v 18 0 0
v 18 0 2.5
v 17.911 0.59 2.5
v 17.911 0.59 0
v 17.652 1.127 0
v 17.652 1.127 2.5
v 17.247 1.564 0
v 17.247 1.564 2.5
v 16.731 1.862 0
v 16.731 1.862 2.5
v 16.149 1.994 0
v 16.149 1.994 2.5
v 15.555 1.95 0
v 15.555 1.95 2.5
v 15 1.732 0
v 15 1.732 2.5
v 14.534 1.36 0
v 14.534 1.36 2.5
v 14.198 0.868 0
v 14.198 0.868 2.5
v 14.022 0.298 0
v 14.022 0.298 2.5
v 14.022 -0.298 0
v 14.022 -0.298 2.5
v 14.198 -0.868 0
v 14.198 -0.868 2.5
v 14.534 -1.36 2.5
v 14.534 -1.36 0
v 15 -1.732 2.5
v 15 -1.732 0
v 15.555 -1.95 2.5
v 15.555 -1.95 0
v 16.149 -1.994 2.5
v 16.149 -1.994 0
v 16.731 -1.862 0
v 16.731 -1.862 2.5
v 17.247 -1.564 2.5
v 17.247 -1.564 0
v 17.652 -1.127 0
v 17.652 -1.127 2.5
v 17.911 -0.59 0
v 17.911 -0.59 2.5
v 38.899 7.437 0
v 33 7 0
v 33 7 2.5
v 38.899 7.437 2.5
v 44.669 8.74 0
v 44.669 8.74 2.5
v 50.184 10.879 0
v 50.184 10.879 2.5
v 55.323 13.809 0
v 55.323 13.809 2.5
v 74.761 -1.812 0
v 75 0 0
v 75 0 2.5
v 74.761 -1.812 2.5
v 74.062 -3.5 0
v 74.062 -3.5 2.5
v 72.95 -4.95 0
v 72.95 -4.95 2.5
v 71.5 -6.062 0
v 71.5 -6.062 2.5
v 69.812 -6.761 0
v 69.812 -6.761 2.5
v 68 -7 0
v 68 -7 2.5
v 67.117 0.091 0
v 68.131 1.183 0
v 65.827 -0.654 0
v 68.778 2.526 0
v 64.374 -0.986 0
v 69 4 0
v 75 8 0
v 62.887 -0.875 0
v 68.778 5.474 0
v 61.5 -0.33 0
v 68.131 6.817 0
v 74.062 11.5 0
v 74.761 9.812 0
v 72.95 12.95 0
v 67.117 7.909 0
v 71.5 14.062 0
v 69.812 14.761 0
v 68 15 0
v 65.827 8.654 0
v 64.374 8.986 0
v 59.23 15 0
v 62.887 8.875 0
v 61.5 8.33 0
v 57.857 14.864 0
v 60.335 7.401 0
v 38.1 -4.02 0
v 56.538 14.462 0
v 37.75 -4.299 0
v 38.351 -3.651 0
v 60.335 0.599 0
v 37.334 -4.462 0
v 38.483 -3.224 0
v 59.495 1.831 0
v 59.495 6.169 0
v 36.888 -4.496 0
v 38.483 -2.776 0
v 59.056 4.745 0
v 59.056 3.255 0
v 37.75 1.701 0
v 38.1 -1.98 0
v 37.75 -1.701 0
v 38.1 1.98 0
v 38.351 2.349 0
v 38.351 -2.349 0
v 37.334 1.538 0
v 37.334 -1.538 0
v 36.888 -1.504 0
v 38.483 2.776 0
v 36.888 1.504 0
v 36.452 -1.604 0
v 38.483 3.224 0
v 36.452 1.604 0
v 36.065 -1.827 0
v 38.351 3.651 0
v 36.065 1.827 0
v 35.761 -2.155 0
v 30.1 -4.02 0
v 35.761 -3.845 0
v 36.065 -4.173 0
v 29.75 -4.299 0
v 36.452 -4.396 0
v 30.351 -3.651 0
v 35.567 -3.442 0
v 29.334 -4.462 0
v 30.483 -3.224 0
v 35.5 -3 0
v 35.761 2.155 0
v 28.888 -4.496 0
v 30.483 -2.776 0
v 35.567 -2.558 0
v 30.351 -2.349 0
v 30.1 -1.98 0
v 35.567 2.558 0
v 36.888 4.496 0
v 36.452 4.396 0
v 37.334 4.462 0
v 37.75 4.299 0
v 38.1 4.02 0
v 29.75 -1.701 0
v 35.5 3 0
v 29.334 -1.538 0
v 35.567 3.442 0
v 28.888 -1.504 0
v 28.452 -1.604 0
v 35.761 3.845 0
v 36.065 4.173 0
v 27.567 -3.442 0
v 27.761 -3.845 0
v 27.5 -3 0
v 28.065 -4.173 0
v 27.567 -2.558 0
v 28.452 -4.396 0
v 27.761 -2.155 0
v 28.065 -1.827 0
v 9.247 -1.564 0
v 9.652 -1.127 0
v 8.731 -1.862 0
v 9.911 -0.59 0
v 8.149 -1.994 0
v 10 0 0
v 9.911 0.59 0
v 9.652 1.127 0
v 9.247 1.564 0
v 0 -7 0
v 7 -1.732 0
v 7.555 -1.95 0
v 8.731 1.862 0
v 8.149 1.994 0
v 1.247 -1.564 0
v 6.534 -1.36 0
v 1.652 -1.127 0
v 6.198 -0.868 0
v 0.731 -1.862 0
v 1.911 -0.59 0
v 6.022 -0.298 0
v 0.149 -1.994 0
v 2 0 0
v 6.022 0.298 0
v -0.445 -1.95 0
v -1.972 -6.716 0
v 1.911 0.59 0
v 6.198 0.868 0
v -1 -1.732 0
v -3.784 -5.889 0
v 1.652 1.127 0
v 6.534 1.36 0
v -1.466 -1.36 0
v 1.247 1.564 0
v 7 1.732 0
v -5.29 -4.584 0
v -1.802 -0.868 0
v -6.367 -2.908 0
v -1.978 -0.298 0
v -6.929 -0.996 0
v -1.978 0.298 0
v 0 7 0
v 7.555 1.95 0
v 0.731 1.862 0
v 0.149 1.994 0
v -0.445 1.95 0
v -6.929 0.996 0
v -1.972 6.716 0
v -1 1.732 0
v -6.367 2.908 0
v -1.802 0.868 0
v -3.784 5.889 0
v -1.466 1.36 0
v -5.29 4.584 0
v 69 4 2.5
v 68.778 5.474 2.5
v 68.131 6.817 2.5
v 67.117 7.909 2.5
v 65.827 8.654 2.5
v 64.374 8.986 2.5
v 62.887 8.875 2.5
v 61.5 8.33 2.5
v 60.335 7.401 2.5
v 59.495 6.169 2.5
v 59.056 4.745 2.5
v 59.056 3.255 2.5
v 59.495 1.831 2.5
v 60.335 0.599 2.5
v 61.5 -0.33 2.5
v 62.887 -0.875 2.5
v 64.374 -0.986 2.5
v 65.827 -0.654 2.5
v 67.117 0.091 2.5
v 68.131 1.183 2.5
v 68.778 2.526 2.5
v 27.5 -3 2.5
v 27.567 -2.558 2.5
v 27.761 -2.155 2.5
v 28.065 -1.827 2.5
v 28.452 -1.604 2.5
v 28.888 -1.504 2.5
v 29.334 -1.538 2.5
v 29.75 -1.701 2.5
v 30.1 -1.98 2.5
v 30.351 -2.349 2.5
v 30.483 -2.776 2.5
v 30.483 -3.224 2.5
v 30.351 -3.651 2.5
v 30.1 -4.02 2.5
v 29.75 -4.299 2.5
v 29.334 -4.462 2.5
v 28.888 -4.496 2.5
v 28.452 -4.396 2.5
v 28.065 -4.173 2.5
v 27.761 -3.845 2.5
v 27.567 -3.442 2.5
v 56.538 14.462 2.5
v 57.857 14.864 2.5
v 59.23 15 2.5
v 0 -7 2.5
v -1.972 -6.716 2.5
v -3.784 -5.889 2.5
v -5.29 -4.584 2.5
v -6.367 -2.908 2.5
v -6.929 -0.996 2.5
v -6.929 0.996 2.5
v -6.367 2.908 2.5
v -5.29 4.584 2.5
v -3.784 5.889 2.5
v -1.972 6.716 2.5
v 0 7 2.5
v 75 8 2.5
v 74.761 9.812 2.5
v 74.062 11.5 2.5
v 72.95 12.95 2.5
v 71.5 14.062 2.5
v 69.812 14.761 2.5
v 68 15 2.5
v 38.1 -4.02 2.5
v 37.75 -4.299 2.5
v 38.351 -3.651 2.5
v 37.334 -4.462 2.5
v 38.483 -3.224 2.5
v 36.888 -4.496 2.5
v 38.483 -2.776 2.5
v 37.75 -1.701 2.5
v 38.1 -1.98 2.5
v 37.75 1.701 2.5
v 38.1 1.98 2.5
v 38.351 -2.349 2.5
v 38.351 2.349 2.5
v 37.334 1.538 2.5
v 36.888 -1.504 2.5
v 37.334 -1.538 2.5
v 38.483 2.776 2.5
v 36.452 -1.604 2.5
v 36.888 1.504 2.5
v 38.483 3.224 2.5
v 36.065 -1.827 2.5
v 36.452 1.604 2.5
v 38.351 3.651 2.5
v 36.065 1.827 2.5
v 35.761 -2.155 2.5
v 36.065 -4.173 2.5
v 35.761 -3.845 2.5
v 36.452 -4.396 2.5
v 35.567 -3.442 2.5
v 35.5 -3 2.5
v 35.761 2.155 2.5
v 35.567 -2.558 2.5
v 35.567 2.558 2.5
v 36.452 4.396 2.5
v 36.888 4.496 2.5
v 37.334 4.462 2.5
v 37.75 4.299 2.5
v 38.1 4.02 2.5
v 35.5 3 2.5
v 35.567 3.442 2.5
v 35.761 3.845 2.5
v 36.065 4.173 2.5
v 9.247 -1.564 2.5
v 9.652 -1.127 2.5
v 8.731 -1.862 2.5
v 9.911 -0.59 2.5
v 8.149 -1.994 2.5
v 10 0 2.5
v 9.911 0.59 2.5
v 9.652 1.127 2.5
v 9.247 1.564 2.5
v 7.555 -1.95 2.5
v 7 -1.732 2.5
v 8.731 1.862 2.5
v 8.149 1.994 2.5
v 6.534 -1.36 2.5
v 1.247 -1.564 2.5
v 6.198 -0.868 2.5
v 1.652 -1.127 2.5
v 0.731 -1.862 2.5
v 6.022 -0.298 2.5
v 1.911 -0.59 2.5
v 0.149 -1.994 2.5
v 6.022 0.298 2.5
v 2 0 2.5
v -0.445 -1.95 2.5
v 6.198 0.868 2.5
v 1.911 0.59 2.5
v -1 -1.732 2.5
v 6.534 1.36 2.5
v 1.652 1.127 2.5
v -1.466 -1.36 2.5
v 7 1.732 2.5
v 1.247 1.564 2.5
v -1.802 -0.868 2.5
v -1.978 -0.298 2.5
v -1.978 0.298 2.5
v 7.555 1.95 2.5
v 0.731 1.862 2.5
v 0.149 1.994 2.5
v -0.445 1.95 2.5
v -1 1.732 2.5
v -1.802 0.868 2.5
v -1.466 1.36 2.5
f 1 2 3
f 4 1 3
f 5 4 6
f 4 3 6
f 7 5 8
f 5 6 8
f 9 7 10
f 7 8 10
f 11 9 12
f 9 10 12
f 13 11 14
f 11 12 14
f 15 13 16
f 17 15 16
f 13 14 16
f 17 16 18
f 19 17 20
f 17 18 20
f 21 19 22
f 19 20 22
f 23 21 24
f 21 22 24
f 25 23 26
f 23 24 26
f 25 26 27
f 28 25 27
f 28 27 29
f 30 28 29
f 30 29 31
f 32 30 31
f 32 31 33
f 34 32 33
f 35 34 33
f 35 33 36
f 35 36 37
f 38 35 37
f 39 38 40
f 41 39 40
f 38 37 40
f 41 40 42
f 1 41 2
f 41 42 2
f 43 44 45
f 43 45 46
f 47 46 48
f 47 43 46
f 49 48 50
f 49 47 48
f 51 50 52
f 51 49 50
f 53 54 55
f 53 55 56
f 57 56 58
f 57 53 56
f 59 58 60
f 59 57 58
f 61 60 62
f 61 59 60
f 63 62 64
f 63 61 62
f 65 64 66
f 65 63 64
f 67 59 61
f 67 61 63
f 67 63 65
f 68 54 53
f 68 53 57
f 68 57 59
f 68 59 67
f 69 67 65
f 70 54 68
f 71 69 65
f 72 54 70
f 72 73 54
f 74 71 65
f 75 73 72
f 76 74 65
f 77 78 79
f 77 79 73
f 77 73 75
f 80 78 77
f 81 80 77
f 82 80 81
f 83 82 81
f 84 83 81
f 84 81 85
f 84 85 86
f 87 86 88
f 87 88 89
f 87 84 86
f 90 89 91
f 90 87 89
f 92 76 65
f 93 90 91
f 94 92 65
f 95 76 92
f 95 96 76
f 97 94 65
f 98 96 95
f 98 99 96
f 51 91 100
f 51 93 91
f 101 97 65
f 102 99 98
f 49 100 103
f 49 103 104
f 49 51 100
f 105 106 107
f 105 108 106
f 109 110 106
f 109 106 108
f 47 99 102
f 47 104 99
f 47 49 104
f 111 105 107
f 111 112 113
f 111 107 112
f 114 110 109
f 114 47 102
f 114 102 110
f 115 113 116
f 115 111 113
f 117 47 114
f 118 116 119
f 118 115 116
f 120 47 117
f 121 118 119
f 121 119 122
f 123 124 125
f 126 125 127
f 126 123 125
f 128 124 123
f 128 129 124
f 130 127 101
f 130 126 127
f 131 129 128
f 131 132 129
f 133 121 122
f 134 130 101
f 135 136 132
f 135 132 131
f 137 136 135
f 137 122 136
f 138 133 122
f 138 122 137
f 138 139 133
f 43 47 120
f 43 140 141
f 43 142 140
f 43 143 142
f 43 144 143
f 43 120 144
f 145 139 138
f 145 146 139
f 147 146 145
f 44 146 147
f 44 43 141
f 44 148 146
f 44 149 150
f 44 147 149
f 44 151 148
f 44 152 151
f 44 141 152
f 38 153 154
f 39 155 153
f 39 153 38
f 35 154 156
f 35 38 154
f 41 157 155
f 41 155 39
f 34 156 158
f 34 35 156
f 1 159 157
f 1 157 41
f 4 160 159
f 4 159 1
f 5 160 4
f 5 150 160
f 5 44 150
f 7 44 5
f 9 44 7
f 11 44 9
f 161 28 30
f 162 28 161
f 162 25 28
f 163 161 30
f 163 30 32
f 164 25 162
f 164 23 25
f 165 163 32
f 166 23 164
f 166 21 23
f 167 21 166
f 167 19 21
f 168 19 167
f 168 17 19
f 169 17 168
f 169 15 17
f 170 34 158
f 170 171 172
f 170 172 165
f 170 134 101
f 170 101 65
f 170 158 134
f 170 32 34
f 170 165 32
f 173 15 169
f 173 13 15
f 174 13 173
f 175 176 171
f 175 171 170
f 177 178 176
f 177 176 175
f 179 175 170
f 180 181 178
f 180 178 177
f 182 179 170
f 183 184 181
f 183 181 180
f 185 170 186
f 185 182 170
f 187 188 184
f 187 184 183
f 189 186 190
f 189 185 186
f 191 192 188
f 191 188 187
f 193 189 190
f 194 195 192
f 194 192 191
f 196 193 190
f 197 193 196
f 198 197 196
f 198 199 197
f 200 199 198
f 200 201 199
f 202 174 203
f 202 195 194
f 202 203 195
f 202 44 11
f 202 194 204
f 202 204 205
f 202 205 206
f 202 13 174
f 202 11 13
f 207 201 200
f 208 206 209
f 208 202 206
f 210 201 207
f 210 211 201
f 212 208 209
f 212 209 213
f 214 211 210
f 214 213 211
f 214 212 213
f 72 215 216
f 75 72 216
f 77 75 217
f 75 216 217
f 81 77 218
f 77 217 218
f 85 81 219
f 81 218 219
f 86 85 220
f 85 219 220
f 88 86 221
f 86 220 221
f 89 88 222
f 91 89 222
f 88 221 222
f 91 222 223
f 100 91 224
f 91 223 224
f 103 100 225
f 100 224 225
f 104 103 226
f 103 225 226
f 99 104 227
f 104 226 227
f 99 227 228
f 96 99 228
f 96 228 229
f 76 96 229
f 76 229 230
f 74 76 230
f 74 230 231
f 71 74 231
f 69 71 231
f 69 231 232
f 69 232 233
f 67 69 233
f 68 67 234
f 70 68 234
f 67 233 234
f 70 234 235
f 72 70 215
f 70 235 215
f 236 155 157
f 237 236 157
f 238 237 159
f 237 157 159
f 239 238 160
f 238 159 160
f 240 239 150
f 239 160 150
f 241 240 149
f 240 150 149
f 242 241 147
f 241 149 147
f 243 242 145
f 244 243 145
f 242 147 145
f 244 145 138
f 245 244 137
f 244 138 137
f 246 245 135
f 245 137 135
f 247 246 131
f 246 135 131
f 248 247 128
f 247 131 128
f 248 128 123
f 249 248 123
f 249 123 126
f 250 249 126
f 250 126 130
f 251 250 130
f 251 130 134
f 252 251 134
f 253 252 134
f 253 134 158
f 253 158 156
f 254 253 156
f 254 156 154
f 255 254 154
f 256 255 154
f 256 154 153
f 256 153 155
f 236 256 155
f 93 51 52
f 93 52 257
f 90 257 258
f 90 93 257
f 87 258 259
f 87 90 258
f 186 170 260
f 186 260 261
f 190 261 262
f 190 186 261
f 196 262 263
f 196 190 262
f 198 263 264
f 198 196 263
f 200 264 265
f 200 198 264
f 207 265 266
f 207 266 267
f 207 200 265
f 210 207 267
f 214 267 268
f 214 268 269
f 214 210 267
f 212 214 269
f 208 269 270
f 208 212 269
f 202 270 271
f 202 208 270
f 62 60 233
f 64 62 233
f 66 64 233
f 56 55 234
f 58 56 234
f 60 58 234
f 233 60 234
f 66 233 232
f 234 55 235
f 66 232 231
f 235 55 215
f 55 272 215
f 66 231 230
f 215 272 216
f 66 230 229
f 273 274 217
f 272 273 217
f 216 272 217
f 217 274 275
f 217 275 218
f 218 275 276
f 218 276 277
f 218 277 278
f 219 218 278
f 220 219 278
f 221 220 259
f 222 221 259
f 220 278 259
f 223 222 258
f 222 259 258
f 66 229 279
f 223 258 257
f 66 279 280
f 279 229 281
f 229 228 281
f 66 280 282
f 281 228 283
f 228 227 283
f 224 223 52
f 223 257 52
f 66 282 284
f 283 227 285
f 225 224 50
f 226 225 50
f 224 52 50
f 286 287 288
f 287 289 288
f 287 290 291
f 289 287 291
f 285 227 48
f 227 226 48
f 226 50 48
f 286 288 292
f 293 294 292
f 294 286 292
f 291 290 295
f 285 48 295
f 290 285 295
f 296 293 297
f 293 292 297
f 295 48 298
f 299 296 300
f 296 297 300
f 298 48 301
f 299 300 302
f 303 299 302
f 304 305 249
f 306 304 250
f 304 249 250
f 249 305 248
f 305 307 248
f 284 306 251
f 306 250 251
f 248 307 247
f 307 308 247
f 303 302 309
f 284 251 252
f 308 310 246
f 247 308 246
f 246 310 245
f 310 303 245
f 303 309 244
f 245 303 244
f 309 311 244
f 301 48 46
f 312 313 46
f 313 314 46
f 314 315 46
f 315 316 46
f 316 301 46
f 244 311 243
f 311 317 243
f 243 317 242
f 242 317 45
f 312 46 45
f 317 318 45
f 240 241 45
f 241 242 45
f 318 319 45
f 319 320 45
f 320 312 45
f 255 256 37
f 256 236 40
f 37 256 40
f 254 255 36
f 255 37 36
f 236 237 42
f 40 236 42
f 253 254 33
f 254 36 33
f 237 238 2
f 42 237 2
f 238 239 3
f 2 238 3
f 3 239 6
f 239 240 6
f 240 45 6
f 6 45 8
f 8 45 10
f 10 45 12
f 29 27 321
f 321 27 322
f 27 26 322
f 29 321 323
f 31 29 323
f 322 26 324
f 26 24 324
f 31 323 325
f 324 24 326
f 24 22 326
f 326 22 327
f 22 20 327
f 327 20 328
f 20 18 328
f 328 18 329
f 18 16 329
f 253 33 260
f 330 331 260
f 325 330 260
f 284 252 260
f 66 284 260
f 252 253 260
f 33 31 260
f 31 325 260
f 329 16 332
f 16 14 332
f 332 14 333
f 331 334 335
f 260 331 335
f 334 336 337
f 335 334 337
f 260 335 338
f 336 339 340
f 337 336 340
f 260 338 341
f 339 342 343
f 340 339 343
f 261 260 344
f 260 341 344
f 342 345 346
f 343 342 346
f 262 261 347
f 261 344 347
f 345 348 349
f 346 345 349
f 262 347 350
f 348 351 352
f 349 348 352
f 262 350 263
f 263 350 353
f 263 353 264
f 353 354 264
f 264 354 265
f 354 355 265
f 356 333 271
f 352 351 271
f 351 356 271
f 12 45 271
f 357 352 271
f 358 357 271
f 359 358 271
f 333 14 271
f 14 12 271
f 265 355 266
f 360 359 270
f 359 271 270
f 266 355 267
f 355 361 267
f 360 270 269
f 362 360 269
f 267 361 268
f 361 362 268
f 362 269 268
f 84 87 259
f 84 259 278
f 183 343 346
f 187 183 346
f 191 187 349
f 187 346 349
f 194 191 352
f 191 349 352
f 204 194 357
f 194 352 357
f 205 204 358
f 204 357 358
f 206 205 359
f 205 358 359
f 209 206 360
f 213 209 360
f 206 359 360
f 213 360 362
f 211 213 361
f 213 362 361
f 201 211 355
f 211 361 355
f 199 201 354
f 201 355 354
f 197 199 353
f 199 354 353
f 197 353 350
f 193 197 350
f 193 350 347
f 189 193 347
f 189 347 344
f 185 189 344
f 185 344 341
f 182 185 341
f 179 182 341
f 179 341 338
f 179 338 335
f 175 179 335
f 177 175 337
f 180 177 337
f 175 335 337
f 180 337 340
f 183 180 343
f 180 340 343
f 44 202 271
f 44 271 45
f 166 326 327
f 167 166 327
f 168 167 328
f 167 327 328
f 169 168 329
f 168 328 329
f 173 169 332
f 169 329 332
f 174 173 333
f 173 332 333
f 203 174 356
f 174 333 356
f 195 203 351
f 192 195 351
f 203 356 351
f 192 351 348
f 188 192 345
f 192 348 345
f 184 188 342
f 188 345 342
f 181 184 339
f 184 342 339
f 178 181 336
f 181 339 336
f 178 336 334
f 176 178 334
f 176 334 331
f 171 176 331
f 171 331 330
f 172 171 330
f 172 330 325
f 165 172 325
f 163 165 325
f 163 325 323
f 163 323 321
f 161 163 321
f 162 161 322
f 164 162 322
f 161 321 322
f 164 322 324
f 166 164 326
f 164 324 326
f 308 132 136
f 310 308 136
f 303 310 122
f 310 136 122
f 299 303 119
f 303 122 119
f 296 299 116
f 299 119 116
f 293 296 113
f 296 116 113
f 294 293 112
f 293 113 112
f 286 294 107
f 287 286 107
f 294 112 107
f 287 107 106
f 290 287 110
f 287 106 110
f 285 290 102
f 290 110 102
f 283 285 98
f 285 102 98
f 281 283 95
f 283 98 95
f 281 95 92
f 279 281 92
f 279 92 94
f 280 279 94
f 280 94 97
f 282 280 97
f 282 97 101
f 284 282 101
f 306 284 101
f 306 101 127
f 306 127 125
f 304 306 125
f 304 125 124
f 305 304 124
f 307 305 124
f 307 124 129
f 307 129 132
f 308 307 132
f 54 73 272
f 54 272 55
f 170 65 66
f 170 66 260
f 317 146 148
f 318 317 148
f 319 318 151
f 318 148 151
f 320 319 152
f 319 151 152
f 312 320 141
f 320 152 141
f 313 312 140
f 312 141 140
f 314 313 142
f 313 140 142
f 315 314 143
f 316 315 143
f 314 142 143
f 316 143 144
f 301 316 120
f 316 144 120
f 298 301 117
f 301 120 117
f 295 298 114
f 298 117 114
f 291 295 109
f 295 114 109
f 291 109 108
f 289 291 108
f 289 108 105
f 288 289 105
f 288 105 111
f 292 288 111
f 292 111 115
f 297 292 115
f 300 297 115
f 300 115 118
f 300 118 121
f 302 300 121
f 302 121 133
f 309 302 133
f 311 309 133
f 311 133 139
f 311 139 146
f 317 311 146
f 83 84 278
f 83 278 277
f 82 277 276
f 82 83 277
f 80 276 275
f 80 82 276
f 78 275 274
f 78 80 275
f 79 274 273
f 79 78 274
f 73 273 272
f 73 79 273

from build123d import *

# Parameters (mm, degrees)
BOSS_EXTRUDE1_DEPTH   = 2.5
SKETCH2_R             = 2
CUT_EXTRUDE1_DEPTH    = 2.5
SKETCH3_R             = 5
CUT_EXTRUDE2_DEPTH    = 2.5
F_3_0MM_DOWEL_HOLE2_D = 3


with BuildPart() as part:
    # Sketch1 → Boss-Extrude1 (new body)
    with BuildSketch(Plane.XY):
        with BuildLine():
            Line((0, 7), (33, 7))
            ThreePointArc((33, 7), (44.66919932, 8.739971416), (55.323194976, 13.808510638))
            ThreePointArc((55.323194976, 13.808510638), (57.187644216, 14.695505002), (59.229754097, 15))
            Line((59.229754097, 15), (68, 15))
            ThreePointArc((68, 15), (72.949747468, 12.949747468), (75, 8))
            Line((75, 8), (75, 0))
            ThreePointArc((75, 0), (72.949747468, -4.949747468), (68, -7))
            Line((68, -7), (0, -7))
            ThreePointArc((0, -7), (-7, 0), (0, 7))
        make_face()
    extrude(amount=BOSS_EXTRUDE1_DEPTH)

    # Sketch2 → Cut-Extrude1 (cut)
    with BuildSketch(Plane.XY.offset(2.5)):
        Circle(SKETCH2_R)
        with Locations((8, 0)):
            Circle(SKETCH2_R)
        with Locations((16, 0)):
            Circle(SKETCH2_R)
    extrude(amount=-CUT_EXTRUDE1_DEPTH, mode=Mode.SUBTRACT)

    # Sketch3 → Cut-Extrude2 (cut)
    with BuildSketch(Plane.XY.offset(2.5)):
        with Locations((64, 4)):
            Circle(SKETCH3_R)
    extrude(amount=-CUT_EXTRUDE2_DEPTH, mode=Mode.SUBTRACT)

    # Ø3.0mm Dowel Hole2 (through all)
    with Locations(Plane.XY.offset(2.5)):
        with Locations((29, -3), (37, -3), (37, 3)):
            Hole(F_3_0MM_DOWEL_HOLE2_D / 2)


solid = part.part
